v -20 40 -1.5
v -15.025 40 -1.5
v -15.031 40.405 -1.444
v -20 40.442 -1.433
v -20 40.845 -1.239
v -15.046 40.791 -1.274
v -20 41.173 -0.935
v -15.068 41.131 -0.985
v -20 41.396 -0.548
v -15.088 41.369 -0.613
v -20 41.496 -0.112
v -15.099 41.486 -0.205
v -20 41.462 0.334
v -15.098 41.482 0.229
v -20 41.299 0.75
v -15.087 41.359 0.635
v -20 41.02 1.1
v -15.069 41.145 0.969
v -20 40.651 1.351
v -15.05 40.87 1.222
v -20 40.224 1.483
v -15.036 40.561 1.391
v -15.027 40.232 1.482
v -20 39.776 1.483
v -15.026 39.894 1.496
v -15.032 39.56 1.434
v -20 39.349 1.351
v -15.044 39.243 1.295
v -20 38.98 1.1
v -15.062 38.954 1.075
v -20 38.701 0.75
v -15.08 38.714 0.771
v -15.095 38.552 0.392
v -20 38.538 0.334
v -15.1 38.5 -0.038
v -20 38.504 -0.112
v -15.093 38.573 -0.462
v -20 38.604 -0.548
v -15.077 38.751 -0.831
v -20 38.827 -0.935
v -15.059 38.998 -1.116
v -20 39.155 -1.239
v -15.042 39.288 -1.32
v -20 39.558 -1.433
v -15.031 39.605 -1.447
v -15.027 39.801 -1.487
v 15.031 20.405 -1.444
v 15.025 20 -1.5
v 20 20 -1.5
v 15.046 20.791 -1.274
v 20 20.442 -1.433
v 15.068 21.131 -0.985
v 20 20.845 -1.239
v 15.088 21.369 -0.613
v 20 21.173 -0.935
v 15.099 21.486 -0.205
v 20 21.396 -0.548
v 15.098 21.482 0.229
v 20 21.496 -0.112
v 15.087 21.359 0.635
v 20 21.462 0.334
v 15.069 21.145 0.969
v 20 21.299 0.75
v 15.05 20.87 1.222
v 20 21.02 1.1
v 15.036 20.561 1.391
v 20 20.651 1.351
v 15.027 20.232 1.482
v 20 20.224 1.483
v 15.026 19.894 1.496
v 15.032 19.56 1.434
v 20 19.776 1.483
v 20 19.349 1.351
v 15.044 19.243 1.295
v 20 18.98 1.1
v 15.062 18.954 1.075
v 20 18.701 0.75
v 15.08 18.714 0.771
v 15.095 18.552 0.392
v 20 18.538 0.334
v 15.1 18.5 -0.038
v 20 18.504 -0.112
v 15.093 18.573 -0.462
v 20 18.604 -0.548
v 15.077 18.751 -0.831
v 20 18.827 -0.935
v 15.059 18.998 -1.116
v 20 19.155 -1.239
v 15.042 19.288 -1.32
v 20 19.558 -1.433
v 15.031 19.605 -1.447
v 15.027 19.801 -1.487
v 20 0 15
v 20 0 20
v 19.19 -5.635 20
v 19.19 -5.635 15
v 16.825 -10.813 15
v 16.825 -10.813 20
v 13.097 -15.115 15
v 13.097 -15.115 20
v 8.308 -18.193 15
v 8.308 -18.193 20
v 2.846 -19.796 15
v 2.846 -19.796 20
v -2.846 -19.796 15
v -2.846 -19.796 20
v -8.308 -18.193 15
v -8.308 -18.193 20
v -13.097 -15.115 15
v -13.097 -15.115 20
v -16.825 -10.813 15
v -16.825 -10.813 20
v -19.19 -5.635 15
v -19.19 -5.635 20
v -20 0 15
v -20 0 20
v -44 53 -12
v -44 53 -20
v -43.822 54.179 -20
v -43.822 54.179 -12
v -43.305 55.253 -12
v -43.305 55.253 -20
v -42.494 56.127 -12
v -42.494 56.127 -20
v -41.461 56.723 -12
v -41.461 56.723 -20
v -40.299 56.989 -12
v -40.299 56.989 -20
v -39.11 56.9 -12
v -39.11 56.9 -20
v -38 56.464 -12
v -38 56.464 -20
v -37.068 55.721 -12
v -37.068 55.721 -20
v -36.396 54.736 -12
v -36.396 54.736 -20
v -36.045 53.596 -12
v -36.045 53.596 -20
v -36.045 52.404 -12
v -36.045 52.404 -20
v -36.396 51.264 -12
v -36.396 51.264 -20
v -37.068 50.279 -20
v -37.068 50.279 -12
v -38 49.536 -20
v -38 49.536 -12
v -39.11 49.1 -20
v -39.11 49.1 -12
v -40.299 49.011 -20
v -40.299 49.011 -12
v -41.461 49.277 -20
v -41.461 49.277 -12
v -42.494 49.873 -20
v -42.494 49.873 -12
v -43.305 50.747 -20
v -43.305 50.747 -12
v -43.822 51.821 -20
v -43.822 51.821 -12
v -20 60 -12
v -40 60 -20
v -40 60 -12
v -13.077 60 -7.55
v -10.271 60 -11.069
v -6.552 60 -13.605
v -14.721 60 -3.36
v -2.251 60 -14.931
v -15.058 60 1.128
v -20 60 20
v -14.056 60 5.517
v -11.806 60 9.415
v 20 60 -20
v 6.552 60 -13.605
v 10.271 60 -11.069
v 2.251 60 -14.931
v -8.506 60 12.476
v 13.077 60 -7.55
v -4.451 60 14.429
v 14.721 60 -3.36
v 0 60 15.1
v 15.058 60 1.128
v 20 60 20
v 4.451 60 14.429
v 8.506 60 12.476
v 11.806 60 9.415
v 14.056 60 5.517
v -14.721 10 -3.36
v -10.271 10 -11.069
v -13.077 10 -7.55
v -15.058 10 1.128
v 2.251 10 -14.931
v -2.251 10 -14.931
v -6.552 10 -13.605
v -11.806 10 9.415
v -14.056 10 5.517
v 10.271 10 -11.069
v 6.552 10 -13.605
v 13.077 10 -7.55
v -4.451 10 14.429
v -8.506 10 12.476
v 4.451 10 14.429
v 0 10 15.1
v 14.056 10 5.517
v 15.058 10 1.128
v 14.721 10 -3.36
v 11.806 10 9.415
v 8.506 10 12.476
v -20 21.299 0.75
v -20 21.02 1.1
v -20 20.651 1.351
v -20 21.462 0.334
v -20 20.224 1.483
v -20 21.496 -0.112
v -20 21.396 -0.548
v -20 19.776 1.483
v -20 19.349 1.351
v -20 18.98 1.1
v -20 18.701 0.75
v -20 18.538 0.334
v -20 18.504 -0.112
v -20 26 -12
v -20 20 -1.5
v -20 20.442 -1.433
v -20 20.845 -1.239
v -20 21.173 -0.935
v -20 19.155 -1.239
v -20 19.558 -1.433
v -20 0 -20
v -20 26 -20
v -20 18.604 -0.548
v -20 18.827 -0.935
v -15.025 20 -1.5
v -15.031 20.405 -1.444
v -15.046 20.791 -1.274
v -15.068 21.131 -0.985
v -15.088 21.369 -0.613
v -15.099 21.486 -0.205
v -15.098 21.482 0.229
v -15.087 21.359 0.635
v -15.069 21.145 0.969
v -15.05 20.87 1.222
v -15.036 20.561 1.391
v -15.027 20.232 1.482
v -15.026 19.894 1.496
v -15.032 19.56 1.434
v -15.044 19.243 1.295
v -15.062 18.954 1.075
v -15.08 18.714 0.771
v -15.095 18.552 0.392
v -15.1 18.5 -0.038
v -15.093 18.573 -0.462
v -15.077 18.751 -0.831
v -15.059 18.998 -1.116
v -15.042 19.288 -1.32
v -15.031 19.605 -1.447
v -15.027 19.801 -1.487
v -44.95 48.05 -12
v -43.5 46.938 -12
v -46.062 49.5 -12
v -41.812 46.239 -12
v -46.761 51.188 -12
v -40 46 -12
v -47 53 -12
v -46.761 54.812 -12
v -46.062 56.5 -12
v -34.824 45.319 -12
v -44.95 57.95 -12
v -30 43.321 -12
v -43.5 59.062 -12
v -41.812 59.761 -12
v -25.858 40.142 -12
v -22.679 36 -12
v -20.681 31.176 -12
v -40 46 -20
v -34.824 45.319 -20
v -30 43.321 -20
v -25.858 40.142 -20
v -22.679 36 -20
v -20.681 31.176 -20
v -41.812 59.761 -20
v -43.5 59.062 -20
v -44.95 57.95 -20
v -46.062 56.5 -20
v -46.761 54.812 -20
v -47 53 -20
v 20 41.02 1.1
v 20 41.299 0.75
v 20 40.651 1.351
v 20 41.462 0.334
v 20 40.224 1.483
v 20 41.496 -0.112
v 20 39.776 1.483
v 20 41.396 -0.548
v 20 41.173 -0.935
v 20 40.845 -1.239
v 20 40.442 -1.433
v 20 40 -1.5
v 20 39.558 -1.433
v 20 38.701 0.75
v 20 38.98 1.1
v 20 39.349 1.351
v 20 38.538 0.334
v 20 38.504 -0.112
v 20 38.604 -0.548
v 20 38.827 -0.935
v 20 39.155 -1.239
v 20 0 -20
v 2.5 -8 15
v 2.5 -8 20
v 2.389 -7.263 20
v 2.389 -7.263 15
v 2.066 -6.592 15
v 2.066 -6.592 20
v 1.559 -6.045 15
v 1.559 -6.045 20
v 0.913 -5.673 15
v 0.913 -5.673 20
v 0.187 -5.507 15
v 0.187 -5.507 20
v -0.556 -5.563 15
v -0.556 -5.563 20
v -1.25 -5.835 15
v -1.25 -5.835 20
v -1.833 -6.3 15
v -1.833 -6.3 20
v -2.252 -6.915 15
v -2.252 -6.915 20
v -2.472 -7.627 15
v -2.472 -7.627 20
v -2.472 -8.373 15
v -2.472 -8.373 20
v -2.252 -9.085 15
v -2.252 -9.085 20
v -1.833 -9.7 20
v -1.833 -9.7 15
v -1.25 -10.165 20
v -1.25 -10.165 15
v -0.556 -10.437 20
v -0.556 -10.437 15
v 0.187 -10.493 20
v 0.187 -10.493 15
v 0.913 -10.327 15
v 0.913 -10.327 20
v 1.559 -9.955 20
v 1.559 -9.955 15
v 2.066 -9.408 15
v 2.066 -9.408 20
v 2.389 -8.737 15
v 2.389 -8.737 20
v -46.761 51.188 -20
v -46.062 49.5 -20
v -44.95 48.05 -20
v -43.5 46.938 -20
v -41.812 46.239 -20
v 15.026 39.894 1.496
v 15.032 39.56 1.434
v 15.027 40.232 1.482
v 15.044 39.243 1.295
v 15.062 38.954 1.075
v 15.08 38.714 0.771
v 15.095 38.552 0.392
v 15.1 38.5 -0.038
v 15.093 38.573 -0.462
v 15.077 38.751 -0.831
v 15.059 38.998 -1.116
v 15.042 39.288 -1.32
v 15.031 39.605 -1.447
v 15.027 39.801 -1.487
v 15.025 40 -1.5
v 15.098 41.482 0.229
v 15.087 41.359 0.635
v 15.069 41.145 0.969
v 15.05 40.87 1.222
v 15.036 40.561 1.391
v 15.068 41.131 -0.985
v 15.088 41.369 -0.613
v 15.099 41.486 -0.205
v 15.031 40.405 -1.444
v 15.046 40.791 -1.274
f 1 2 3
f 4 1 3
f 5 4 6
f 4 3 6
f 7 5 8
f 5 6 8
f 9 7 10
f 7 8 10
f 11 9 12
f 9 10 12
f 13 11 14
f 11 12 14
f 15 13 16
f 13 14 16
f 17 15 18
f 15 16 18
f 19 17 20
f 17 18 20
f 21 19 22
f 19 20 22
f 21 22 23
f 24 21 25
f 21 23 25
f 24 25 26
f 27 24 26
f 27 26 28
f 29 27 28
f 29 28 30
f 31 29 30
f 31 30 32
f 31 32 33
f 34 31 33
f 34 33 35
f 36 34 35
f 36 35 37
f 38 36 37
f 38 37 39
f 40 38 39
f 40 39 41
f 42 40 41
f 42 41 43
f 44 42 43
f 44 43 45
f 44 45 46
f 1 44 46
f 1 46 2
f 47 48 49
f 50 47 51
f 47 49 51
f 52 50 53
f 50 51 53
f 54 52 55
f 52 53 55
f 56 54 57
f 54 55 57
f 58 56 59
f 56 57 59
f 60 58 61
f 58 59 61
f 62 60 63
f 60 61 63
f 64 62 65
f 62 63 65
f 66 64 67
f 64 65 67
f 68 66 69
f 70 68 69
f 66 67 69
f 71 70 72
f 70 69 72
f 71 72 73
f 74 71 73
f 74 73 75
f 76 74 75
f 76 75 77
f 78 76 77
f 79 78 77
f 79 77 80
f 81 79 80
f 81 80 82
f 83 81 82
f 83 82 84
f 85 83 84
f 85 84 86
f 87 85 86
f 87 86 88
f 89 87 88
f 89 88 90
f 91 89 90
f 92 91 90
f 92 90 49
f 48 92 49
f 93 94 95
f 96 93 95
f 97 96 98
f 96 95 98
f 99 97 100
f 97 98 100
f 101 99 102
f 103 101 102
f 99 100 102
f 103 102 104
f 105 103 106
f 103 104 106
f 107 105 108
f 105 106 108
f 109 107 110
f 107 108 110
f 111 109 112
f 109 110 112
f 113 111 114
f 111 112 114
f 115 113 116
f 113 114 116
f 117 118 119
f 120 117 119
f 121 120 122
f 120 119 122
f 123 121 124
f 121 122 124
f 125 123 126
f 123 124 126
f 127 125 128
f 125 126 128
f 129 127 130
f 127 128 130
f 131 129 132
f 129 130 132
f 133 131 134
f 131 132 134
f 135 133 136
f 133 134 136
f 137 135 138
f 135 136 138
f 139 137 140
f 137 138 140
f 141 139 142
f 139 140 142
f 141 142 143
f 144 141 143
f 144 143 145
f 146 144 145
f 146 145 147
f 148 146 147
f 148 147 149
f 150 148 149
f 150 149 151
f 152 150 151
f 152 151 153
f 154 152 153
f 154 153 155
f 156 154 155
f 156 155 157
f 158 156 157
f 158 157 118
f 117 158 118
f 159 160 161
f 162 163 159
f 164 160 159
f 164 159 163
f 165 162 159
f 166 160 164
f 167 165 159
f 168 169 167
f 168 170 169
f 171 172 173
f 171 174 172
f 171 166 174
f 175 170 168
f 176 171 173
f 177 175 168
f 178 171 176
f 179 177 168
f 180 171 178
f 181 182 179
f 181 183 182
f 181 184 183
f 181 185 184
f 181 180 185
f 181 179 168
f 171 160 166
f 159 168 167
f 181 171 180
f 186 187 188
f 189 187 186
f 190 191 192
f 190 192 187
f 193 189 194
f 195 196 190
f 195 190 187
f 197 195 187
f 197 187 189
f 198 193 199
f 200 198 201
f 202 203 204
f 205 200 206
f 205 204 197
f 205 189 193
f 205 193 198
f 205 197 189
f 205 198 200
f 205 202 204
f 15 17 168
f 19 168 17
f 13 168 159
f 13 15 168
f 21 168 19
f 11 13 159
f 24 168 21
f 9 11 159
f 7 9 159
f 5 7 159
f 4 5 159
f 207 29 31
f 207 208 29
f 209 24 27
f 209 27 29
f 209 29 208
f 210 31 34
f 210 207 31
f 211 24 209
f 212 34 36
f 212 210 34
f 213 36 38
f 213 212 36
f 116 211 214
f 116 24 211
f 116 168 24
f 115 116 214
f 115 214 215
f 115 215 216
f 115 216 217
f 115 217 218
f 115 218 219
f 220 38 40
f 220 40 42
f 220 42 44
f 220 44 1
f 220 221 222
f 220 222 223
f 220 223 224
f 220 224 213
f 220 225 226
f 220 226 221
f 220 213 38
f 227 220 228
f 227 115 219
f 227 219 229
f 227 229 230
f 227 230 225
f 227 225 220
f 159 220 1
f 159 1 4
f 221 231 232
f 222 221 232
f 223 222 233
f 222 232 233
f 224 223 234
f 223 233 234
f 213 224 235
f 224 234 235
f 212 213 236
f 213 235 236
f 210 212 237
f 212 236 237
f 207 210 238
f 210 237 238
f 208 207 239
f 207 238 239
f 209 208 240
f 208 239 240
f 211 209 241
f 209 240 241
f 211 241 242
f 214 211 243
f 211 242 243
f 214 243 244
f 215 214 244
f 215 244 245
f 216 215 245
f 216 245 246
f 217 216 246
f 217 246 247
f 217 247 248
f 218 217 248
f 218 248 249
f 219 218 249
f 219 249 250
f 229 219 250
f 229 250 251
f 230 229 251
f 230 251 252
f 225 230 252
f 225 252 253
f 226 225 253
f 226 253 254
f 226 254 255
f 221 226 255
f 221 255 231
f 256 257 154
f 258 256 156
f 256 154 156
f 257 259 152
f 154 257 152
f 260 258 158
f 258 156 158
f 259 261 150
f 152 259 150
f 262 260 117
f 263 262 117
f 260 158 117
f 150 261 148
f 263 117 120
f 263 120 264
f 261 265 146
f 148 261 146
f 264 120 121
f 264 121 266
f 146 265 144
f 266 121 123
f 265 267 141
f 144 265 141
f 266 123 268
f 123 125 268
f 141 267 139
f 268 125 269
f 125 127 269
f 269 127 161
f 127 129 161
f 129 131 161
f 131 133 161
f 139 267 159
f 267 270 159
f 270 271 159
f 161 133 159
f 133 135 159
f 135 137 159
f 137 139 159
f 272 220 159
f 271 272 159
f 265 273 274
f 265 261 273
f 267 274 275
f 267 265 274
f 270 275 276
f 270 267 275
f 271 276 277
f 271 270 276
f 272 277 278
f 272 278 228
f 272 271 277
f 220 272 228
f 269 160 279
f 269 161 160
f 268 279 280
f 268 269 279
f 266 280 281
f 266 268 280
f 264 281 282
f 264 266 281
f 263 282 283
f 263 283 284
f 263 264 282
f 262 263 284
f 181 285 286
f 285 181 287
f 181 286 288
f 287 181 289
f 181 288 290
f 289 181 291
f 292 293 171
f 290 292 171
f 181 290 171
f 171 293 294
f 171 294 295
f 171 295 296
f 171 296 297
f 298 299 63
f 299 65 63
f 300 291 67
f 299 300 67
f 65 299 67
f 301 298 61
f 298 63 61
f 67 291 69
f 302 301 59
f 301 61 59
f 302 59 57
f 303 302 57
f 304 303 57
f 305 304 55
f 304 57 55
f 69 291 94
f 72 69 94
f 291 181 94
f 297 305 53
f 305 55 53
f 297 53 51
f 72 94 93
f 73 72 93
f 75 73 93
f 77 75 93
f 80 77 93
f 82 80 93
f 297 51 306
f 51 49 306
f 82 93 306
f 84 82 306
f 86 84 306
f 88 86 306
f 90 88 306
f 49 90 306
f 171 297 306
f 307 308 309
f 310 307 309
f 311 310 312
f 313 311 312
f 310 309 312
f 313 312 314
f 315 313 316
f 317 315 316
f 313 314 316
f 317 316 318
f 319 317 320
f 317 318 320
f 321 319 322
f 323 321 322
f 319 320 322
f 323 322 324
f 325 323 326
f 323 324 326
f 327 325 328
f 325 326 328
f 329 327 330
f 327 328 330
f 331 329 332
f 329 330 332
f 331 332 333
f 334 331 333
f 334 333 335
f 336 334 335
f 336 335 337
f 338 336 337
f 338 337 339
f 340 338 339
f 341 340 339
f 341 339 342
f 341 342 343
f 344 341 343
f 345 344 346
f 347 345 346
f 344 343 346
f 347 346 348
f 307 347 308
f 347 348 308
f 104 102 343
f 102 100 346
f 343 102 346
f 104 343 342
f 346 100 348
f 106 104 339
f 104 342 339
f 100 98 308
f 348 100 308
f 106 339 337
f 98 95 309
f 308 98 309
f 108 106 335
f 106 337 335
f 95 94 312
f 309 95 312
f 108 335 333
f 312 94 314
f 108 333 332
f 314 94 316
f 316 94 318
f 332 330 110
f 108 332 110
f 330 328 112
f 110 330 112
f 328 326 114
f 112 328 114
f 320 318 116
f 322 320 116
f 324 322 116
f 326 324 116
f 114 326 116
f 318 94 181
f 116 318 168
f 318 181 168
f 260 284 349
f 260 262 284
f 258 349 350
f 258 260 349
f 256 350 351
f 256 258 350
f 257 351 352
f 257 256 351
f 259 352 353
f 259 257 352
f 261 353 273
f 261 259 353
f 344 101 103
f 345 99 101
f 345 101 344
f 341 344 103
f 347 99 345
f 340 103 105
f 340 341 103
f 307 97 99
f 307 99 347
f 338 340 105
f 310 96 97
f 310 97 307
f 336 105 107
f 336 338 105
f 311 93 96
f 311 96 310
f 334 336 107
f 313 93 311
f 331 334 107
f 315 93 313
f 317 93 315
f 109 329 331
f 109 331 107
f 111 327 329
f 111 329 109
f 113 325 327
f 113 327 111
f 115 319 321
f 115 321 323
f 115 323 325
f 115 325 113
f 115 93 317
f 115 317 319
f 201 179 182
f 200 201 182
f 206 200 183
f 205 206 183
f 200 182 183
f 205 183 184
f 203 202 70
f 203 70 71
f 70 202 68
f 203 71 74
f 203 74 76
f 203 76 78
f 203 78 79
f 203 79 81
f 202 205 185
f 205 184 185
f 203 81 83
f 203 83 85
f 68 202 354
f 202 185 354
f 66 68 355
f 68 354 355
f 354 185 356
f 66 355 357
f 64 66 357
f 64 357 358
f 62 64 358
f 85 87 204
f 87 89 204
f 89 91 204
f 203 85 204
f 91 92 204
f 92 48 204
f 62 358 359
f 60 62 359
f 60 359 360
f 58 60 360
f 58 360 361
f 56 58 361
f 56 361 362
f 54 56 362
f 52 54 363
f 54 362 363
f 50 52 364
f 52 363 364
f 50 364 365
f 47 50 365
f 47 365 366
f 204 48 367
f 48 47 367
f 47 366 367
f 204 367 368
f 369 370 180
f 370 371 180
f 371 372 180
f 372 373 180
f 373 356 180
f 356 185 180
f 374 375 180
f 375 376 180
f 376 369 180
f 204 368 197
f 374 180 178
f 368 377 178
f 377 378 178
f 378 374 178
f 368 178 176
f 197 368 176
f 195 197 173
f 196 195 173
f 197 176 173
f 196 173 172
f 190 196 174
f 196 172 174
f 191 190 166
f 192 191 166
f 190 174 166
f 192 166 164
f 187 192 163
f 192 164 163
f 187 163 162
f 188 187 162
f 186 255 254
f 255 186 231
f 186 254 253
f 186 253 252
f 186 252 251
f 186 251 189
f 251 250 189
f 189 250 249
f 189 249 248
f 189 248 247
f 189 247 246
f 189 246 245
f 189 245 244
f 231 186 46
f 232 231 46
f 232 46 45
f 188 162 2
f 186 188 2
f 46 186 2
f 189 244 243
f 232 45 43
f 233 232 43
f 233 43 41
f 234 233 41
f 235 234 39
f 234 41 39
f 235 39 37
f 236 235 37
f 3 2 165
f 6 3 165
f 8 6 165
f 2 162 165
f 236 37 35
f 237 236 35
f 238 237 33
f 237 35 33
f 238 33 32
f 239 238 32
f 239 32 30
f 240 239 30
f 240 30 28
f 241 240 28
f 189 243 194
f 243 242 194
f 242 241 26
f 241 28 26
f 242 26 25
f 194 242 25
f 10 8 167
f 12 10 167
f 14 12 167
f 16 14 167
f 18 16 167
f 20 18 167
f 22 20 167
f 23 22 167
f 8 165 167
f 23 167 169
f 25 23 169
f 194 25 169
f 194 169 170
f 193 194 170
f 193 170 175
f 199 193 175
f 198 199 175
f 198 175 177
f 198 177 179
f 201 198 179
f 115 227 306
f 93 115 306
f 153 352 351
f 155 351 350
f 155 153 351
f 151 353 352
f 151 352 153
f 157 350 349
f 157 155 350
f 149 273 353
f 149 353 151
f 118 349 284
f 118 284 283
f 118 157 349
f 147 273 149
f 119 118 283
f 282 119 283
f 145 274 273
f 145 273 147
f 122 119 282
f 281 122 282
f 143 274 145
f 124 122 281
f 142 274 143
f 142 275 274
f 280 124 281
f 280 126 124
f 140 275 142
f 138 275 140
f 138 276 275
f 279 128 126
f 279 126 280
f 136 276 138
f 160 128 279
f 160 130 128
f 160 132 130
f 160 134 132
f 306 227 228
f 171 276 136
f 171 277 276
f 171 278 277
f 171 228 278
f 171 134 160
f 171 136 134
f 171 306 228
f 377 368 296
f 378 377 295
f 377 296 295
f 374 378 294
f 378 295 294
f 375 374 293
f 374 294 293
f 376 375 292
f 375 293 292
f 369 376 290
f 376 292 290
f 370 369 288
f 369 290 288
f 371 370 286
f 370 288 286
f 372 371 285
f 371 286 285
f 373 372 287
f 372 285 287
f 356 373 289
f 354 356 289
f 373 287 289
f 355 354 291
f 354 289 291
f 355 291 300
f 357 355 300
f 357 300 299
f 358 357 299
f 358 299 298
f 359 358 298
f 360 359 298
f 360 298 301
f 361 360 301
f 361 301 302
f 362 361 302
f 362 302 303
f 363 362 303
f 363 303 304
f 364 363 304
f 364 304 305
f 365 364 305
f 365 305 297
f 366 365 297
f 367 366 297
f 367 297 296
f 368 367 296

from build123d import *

# Parameters (mm, degrees)
SKETCH_1_W             = 40
SKETCH_1_H             = 40
EXTRUDE_1_DEPTH        = 60
SKETCH_2_R             = 15.1
CUT_EXTRUDE_1_DEPTH    = 50
SKETCH_3_R             = 2.5
EXTRUDE_2_DEPTH        = 5
SKETCH_4_R             = 1.5
CUT_EXTRUDE_2_DEPTH    = 75.833147735
PATTERN_LINEAR_1_COUNT = 2
PATTERN_LINEAR_1_PITCH = 20
SKETCH_5_W             = 8
SKETCH_5_H             = 14
EXTRUDE_3_DEPTH        = 27
FILLET_1_R             = 7
CUT_EXTRUDE_3_REACH    = 88.076
SKETCH_6_R             = 4
FILLET_2_R             = 20


with BuildPart() as part:
    # 草圖1 → 填料-伸長1 (new body)
    with BuildSketch(Plane(origin=(0, 0, 0), x_dir=(1, 0, 0), z_dir=(0, 1, 0))):
        Rectangle(SKETCH_1_W, SKETCH_1_H)
    extrude(amount=EXTRUDE_1_DEPTH)

    # 草圖2 → 除料-伸長1 (cut)
    with BuildSketch(Plane(origin=(0, 60, 0), x_dir=(1, 0, 0), z_dir=(0, 1, 0))):
        with Locations(Location((0, 0, 0), (0, 0, 270))):
            Circle(SKETCH_2_R)
    extrude(amount=-CUT_EXTRUDE_1_DEPTH, mode=Mode.SUBTRACT)

    # 草圖3 → 填料-伸長2 (add)
    with BuildSketch(Plane.XY.offset(20)):
        with BuildLine():
            Line((-20, 0), (20, 0))
            ThreePointArc((20, 0), (0, -20), (-20, 0))
        make_face()
        with Locations((0, -8)):
            Circle(SKETCH_3_R, mode=Mode.SUBTRACT)
    extrude(amount=-EXTRUDE_2_DEPTH)

    # 草圖4 → 除料-伸長2 (cut, through all)
    with BuildSketch(Plane(origin=(20, 0, 0), x_dir=(0, 0, -1), z_dir=(1, 0, 0))):
        with Locations((0, 20)):
            Circle(SKETCH_4_R)
    cut_extrude_2 = extrude(amount=-CUT_EXTRUDE_2_DEPTH, mode=Mode.SUBTRACT)

    # 直線複製排列1: 除料-伸長2 ×2
    with Locations(*[(0, i * PATTERN_LINEAR_1_PITCH, 0) for i in range(1, PATTERN_LINEAR_1_COUNT)]):
        add(cut_extrude_2, mode=Mode.SUBTRACT)

    # 草圖5 → 填料-伸長3 (add)
    with BuildSketch(Plane.ZY.offset(20)):
        with Locations((-16, 53)):
            Rectangle(SKETCH_5_W, SKETCH_5_H)
    extrude(amount=EXTRUDE_3_DEPTH)

    # 圓角1
    fillet_1_edges = [part.edges().sort_by_distance(p)[0] for p in [
        (-47, 46, -16),
        (-47, 60, -16),
    ]]
    fillet(fillet_1_edges, radius=FILLET_1_R - 0.0001)  # a hair under: the kernel refuses the full size

    # 草圖6 → 除料-伸長3 (cut, up to next)
    with BuildSketch(Plane(origin=(0, 0, -20), x_dir=(-1, 0, 0), z_dir=(0, 0, -1)), mode=Mode.PRIVATE) as cut_extrude_3_sk1:
        with Locations((40, 53)):
            Circle(SKETCH_6_R)
    cut_extrude_3_tool1 = extrude(cut_extrude_3_sk1.sketch, amount=-CUT_EXTRUDE_3_REACH, mode=Mode.PRIVATE) & part.part
    add(cut_extrude_3_tool1.solids().sort_by_distance((-40, 53, -20))[0], mode=Mode.SUBTRACT)

    # 圓角2
    fillet_2_edges = [part.edges().sort_by_distance(p)[0] for p in [
        (-20, 46, -16),
    ]]
    fillet(fillet_2_edges, radius=FILLET_2_R)


solid = part.part
